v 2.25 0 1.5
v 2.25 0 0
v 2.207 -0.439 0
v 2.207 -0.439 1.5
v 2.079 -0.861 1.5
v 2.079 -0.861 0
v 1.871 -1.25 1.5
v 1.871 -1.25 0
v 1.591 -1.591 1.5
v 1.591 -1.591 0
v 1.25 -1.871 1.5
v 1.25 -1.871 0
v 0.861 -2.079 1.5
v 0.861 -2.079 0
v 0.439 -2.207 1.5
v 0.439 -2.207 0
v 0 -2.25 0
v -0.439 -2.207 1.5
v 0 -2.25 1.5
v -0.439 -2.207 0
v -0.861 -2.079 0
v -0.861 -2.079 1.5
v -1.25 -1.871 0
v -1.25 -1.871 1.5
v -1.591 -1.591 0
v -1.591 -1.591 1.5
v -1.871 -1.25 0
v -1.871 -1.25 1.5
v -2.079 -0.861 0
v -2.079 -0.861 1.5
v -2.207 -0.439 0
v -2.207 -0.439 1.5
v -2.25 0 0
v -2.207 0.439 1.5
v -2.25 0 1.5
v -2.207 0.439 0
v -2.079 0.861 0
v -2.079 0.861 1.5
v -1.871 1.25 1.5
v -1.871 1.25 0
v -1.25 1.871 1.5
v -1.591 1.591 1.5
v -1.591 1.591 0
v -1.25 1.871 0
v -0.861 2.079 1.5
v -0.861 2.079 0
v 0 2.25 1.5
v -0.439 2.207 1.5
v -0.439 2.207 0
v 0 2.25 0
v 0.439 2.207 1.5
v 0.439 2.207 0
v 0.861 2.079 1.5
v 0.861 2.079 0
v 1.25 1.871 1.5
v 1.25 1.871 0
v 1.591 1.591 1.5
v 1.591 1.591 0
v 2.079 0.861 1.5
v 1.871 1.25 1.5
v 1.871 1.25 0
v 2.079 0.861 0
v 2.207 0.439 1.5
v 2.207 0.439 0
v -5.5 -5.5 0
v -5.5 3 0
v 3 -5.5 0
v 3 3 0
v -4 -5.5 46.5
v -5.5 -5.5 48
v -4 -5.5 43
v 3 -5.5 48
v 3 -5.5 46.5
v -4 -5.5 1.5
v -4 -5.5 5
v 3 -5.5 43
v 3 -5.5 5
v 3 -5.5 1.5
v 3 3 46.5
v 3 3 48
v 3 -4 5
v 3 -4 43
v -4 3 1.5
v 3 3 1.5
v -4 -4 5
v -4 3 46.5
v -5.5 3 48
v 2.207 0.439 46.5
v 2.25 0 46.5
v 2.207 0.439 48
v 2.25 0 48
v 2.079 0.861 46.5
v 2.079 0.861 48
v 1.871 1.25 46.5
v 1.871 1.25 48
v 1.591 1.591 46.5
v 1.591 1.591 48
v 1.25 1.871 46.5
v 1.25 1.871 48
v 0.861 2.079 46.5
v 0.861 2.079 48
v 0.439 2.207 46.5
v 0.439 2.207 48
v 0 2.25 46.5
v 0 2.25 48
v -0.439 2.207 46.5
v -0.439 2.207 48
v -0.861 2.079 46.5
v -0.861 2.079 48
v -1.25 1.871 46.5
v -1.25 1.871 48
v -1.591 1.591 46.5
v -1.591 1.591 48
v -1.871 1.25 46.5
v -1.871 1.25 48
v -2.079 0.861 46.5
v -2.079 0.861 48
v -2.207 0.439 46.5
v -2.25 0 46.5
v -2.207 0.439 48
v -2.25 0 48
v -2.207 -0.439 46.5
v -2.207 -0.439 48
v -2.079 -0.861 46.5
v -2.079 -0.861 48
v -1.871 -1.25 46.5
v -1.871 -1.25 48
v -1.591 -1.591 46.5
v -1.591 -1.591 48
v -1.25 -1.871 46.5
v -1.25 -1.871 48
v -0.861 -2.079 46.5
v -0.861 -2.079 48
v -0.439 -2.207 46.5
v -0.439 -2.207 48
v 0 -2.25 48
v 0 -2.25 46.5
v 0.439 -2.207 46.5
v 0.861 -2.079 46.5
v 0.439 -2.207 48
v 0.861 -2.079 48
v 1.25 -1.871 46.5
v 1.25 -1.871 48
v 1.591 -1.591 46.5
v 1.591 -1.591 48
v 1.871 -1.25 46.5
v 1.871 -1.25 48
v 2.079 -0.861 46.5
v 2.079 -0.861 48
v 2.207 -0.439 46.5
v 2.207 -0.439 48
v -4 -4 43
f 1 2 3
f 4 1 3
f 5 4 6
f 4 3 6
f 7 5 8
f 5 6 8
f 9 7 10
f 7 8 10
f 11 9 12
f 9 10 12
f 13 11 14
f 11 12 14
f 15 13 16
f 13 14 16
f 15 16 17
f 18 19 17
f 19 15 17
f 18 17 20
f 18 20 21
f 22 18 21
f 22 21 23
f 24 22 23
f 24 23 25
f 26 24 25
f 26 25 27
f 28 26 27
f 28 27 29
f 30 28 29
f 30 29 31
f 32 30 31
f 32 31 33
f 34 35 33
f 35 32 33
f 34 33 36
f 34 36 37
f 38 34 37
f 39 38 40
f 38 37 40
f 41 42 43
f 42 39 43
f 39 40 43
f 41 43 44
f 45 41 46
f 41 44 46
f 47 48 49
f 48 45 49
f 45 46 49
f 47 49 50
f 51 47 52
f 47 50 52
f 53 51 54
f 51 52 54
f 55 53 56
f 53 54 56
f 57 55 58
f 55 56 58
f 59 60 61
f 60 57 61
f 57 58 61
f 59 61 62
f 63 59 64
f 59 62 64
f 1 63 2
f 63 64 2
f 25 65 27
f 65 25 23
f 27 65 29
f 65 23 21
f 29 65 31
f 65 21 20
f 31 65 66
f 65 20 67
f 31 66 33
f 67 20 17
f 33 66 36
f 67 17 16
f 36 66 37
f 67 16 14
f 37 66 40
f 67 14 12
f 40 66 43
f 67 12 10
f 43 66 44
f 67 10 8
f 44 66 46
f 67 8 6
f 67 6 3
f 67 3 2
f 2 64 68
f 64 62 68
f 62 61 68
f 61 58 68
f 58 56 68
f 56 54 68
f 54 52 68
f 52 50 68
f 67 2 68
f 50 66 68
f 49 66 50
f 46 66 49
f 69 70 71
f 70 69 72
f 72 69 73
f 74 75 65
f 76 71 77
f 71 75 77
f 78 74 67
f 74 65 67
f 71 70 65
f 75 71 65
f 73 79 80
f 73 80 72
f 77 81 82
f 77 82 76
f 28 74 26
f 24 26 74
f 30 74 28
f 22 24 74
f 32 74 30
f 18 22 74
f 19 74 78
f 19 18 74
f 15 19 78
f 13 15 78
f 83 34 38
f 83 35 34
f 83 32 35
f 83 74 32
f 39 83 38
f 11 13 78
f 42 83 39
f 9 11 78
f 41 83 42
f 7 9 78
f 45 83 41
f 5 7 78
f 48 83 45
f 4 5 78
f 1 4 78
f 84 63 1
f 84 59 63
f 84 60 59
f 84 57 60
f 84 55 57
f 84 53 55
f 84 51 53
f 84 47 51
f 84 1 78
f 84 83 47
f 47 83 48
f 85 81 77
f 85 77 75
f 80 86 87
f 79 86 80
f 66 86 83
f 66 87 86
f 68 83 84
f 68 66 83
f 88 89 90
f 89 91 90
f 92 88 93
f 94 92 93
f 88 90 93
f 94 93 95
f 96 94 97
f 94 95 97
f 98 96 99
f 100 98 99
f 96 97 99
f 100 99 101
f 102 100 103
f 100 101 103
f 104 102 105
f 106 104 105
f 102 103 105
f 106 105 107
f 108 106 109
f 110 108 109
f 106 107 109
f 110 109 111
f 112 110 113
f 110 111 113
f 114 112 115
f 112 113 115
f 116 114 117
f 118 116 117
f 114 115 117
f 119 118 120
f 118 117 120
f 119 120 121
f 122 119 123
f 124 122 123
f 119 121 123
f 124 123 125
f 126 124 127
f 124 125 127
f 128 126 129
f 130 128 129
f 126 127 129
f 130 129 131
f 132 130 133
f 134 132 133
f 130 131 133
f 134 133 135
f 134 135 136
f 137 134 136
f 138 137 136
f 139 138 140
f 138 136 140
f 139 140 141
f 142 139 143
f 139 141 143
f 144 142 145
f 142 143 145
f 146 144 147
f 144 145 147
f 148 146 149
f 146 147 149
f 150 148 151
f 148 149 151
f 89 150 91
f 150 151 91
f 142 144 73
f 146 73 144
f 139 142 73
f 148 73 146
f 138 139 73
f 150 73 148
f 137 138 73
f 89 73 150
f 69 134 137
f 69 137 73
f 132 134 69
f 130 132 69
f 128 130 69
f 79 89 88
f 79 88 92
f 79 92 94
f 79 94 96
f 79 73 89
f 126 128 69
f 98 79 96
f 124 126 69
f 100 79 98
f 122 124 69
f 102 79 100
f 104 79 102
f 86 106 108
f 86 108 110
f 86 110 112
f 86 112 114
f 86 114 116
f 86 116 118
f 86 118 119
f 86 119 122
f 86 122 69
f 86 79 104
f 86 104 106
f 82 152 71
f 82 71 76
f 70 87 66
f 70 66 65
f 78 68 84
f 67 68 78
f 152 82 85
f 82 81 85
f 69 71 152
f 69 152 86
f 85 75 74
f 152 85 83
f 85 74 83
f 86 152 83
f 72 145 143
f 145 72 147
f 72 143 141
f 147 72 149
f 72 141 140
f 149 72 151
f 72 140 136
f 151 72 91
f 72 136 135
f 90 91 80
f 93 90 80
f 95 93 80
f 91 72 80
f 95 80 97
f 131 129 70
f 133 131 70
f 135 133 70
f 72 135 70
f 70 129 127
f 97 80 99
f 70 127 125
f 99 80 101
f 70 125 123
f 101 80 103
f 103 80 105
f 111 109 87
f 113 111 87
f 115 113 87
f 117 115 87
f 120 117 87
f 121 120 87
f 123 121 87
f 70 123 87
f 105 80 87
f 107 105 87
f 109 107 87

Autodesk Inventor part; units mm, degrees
ref_plane "YZ Plane" through (0, 0, 0) normal (1, 0, 0) x (0, 1, 0)
ref_plane "XZ Plane" through (0, 0, 0) normal (0, 1, 0) x (-1, 0, 0)
sketch "Sketch1" plane through (0, 0, 0) normal (0, 0, 1) x (1, 0, 0)
  circle A0 centre (0, 0) radius 2.25
  line L0 (-4, 3) -> (3, 3)
  line L1 (3, 3) -> (3, -4)
  line L2 (3, -4) -> (-4, -4)
  line L3 (-4, -4) -> (-4, 3)
  line L4 (-4, 3) -> (-5.5, 3)
  line L5 (-5.5, 3) -> (-5.5, -5.5)
  line L6 (-5.5, -5.5) -> (-4, -5.5)
  line L7 (-4, -5.5) -> (-4, 3)
  line L8 (3, -4) -> (-4, -4)
  line L9 (-4, -4) -> (-4, -5.5)
  line L10 (-4, -5.5) -> (3, -5.5)
  line L11 (3, -5.5) -> (3, -4)
  dimension "d0" = 4.5
  dimension "d1" = 4
  dimension "d2" = 4
  dimension "d3" = 3
  dimension "d5" = 3
  dimension "d6" = 1.5
  dimension "d7" = 1.5
extrude "Extrusion1" add sketch "Sketch1" along normal blind 1.5
extrude "Extrusion2" add sketch "Sketch1" along normal blind 46.5 contours L3 L7 L6 L5 L4 | L2 L11 L10 L7
ref_plane "Work Plane2" through (0, 0, 24) normal (0, 0, 1) x (1, 0, 0)
mirror "Mirror2" about plane through (0, 0, 24) normal (0, 0, 1) of "Extrusion1"
sketch "Sketch2" plane through (-4, -4, 1.5) normal (0, 1, 0) x (1, 0, 0)
  line L0 (7, 0) -> (7, -45) projected
  line L1 (0, 0) -> (7, 0)
  line L2 (7, 0) -> (7, -3.5)
  line L3 (7, -3.5) -> (0, -3.5)
  line L4 (0, -3.5) -> (0, 0)
  point P0 (4, 1.5)
  dimension "d13" = 3.5
extrude "Extrusion3" cut sketch "Sketch2" against normal blind 10
mirror "Mirror3" about plane through (0, 0, 24) normal (0, 0, 1) of "Extrusion3"
properties part number "Lifter"
